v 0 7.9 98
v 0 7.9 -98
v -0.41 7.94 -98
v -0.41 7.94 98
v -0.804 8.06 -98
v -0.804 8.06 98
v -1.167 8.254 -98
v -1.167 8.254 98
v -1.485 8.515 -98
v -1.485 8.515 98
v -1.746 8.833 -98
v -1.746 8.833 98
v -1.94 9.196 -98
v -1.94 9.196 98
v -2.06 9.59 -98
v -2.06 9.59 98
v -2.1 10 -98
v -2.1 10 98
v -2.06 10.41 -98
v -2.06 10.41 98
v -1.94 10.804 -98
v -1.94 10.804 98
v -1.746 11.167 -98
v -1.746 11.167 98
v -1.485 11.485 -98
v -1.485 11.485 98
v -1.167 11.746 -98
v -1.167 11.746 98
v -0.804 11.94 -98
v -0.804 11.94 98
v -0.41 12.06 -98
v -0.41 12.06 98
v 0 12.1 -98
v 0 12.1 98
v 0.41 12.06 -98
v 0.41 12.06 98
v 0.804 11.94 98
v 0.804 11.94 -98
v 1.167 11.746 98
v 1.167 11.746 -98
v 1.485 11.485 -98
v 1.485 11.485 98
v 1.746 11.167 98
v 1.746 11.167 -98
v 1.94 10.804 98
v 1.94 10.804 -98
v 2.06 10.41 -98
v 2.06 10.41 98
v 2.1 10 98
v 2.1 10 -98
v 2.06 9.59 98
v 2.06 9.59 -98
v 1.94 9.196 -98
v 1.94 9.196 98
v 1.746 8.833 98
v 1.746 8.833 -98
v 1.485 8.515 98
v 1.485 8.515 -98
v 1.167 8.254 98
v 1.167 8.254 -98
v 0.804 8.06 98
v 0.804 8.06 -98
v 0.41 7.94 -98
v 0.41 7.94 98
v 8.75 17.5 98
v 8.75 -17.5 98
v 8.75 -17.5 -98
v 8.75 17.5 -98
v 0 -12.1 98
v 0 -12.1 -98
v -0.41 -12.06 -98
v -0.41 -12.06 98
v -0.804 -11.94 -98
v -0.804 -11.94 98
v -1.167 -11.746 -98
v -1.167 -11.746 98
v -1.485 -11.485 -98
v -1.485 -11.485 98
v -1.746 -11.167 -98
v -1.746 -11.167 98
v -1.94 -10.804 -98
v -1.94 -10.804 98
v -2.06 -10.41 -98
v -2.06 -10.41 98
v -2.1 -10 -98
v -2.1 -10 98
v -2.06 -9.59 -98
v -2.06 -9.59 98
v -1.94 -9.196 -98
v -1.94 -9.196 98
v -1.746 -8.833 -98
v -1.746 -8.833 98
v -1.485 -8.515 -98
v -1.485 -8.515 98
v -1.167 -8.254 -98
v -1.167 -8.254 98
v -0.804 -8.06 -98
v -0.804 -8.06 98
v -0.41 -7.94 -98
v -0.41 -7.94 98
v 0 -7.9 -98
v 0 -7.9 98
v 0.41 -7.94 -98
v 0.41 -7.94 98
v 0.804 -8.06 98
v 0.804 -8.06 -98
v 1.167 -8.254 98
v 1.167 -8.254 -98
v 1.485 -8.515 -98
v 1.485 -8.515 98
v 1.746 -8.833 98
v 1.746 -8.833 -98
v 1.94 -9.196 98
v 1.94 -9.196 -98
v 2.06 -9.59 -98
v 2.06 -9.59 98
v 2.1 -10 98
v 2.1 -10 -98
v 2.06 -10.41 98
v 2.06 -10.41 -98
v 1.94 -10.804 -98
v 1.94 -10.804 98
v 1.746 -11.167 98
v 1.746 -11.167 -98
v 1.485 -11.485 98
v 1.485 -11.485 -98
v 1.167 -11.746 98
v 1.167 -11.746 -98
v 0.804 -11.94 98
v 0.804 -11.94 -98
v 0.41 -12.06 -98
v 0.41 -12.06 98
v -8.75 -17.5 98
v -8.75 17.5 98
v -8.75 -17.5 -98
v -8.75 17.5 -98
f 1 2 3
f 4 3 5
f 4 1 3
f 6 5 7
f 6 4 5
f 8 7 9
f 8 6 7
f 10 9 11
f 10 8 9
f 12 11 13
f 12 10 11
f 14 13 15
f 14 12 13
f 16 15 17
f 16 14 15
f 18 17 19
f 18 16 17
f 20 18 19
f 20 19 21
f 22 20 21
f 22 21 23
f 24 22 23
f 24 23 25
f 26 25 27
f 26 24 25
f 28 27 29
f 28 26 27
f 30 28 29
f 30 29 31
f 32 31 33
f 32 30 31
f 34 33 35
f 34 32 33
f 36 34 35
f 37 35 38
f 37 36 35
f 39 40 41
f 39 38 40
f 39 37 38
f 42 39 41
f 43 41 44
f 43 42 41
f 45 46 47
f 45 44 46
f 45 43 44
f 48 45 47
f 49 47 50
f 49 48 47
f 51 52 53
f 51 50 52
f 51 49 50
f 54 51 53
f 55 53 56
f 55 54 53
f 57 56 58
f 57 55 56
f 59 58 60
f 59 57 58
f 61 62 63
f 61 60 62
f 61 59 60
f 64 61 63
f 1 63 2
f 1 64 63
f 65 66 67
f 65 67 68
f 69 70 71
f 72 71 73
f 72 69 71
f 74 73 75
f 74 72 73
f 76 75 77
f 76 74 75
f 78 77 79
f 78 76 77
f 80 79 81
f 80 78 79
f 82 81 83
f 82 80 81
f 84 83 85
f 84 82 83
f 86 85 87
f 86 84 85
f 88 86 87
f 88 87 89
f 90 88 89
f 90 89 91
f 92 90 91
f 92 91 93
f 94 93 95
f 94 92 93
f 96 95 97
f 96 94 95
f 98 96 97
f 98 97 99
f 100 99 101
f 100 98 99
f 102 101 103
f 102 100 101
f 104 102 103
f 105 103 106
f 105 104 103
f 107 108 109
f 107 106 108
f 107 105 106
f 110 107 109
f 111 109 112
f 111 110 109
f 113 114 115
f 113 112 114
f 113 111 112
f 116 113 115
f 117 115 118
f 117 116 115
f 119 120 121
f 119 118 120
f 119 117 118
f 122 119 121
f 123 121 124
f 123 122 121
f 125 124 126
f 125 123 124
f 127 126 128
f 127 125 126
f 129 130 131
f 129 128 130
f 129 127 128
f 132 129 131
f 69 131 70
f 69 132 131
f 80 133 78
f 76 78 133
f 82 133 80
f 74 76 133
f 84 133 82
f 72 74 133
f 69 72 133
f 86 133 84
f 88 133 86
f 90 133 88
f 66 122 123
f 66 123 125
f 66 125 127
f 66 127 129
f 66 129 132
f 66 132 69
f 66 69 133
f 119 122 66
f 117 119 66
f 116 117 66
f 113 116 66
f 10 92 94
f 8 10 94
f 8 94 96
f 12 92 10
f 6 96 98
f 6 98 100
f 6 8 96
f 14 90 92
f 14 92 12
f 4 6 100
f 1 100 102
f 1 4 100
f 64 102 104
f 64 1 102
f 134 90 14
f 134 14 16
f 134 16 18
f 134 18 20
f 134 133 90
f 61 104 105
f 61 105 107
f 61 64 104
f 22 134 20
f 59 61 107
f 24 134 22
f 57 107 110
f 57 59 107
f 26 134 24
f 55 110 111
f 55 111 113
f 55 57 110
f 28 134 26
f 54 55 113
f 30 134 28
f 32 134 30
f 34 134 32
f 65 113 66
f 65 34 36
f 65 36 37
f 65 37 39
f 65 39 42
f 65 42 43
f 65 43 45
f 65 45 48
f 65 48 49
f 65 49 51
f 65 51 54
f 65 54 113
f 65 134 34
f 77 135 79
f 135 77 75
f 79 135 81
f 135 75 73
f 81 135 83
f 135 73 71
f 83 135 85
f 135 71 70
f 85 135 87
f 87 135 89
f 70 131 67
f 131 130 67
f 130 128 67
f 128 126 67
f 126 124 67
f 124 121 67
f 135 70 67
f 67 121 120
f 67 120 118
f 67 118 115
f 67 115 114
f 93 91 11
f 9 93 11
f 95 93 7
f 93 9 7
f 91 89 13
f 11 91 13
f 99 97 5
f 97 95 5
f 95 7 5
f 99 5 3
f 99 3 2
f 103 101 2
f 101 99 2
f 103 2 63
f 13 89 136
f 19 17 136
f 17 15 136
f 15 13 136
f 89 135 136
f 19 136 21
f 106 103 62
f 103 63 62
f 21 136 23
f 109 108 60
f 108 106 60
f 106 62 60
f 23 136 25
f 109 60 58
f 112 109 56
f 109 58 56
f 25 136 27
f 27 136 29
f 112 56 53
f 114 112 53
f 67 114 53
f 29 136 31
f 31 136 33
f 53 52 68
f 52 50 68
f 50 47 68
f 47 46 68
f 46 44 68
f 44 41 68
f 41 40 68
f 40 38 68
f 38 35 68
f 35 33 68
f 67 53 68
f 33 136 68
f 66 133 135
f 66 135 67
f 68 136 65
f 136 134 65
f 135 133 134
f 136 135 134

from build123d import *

# Parameters (mm, degrees)
IZIM1_W                     = 17.5
IZIM1_H                     = 35
Y_KSEKLIK_EKSTR_ZYON1_DEPTH = 98
M5_DI_LI_DELIK1_AT_2_COUNT  = 2
M5_DI_LI_DELIK1_AT_2_PITCH  = 20


with BuildPart() as part:
    # Çizim1 → Yükseklik-Ekstrüzyon1 (new, symmetric)
    with BuildSketch(Plane.XY):
        Rectangle(IZIM1_W, IZIM1_H)
    extrude(amount=Y_KSEKLIK_EKSTR_ZYON1_DEPTH, both=True)

    # Çizim3 → M5 Dişli Delik1 (revolve, cut)
    with BuildSketch(Plane(origin=(0, 10, 98), x_dir=(0, -1, 0), z_dir=(1, 0, 0))):
        Polygon((0, 0), (0, 201.2618073), (2.1, 200), (2.1, 0), align=None)
    m5_di_li_delik1 = revolve(axis=Axis((0, 10, 104.35), (0, 0, -1)), mode=Mode.SUBTRACT)

    # M5 Dişli Delik1 at 2: M5 Dişli Delik1 ×2
    with Locations(*[(0, -i * M5_DI_LI_DELIK1_AT_2_PITCH, 0) for i in range(1, M5_DI_LI_DELIK1_AT_2_COUNT)]):
        add(m5_di_li_delik1, mode=Mode.SUBTRACT)

    # Aynalama1: M5 Dişli Delik1 across plane
    add(m5_di_li_delik1.mirror(Plane.XY), mode=Mode.SUBTRACT)

    # Aynalama1 copy 1 sketch → Aynalama1 copy 1 (revolve, cut)
    with BuildSketch(Plane(origin=(0, -10, -98), x_dir=(0, -1, 0), z_dir=(1, 0, 0))):
        Polygon((0, 0), (0, -201.2618073), (2.1, -200), (2.1, 0), align=None)
    revolve(axis=Axis((0, -10, -104.35), (0, 0, -1)), mode=Mode.SUBTRACT)


solid = part.part
